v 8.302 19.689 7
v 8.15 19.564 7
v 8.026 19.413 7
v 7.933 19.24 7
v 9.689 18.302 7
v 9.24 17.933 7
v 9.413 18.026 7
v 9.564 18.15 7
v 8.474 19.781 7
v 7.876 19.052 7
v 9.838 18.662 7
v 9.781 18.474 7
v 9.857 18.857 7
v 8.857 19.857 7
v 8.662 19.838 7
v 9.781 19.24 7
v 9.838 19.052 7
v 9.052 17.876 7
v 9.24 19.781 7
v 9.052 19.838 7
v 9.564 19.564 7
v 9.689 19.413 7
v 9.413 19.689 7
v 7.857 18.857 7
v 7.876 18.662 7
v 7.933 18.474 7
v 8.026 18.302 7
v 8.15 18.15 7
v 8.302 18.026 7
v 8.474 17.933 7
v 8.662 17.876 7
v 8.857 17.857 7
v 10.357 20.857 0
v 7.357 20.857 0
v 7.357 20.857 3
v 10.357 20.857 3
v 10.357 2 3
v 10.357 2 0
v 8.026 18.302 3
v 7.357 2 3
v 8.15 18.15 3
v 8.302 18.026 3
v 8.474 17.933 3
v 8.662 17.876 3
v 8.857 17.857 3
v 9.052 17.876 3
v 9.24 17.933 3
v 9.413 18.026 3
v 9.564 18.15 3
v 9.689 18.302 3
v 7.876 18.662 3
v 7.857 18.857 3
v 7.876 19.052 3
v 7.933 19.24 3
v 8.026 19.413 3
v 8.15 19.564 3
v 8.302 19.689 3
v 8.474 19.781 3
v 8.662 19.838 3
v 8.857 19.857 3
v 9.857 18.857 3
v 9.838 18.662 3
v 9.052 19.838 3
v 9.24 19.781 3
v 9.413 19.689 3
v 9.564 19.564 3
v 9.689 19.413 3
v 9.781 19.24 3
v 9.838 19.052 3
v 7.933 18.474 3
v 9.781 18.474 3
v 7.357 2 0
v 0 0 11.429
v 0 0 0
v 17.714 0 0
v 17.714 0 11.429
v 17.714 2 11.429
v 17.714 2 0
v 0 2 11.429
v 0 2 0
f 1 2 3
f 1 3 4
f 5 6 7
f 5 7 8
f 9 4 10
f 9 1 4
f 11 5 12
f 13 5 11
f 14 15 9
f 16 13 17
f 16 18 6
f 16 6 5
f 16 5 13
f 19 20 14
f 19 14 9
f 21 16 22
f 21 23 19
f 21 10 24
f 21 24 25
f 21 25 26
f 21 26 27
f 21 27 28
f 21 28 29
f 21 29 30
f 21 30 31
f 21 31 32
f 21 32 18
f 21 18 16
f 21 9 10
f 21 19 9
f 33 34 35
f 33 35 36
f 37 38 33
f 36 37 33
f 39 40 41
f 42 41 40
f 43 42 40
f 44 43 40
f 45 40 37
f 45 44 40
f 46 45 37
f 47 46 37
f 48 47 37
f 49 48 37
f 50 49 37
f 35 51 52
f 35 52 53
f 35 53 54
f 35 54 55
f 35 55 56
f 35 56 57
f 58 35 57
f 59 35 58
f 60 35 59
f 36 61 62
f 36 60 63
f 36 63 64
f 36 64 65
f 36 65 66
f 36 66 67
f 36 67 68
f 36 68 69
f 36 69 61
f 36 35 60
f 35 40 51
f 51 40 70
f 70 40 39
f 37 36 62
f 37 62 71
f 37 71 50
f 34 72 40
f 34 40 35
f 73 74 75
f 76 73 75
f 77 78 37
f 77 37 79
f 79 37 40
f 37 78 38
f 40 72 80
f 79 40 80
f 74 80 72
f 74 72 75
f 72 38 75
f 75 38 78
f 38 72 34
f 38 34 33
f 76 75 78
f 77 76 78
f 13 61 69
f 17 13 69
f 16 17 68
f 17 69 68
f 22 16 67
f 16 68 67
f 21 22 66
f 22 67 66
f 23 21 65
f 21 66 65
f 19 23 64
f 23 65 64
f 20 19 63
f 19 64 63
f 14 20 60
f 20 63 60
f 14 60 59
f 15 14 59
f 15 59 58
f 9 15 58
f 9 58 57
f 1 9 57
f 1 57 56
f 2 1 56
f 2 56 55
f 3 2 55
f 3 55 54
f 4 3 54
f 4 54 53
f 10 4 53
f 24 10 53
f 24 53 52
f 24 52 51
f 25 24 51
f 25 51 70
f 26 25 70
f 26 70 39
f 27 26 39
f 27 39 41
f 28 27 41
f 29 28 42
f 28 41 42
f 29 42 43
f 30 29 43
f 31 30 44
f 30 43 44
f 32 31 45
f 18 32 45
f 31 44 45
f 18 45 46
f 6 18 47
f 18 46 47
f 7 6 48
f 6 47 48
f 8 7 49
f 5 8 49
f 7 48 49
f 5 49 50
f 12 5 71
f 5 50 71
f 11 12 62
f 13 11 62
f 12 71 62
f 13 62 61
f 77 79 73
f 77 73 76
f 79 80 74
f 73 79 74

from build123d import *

# Parameters (mm, degrees)
F1_W     = 3
F1_H     = 18.8571428571
F1_R     = 1
F2_DEPTH = 3
F3_DEPTH = 11.4285714286
F4_DEPTH = 7


with BuildPart() as f2:
    # F1 (on Top) → F2 (new body)
    with BuildSketch(Plane.XY):
        with Locations((8.8571428571, 11.4285714286)):
            Rectangle(F1_W, F1_H)
        with Locations((8.8571428571, 18.8571428571)):
            Circle(F1_R, mode=Mode.SUBTRACT)
        Polygon((0, 2), (0, 0), (17.7142857143, 0), (17.7142857143, 2), (10.3571428571, 2), (7.3571428571, 2), align=None)
        with Locations((8.8571428571, 18.8571428571)):
            Circle(F1_R)
    extrude(amount=F2_DEPTH)

    # F1 (on Top) → F3 (join)
    with BuildSketch(Plane.XY):
        Polygon((0, 2), (0, 0), (17.7142857143, 0), (17.7142857143, 2), (10.3571428571, 2), (7.3571428571, 2), align=None)
    extrude(amount=F3_DEPTH)

    # F1 (on Top) → F4 (join)
    with BuildSketch(Plane.XY):
        with Locations((8.8571428571, 18.8571428571)):
            Circle(F1_R)
    extrude(amount=F4_DEPTH)


solid = f2.part
